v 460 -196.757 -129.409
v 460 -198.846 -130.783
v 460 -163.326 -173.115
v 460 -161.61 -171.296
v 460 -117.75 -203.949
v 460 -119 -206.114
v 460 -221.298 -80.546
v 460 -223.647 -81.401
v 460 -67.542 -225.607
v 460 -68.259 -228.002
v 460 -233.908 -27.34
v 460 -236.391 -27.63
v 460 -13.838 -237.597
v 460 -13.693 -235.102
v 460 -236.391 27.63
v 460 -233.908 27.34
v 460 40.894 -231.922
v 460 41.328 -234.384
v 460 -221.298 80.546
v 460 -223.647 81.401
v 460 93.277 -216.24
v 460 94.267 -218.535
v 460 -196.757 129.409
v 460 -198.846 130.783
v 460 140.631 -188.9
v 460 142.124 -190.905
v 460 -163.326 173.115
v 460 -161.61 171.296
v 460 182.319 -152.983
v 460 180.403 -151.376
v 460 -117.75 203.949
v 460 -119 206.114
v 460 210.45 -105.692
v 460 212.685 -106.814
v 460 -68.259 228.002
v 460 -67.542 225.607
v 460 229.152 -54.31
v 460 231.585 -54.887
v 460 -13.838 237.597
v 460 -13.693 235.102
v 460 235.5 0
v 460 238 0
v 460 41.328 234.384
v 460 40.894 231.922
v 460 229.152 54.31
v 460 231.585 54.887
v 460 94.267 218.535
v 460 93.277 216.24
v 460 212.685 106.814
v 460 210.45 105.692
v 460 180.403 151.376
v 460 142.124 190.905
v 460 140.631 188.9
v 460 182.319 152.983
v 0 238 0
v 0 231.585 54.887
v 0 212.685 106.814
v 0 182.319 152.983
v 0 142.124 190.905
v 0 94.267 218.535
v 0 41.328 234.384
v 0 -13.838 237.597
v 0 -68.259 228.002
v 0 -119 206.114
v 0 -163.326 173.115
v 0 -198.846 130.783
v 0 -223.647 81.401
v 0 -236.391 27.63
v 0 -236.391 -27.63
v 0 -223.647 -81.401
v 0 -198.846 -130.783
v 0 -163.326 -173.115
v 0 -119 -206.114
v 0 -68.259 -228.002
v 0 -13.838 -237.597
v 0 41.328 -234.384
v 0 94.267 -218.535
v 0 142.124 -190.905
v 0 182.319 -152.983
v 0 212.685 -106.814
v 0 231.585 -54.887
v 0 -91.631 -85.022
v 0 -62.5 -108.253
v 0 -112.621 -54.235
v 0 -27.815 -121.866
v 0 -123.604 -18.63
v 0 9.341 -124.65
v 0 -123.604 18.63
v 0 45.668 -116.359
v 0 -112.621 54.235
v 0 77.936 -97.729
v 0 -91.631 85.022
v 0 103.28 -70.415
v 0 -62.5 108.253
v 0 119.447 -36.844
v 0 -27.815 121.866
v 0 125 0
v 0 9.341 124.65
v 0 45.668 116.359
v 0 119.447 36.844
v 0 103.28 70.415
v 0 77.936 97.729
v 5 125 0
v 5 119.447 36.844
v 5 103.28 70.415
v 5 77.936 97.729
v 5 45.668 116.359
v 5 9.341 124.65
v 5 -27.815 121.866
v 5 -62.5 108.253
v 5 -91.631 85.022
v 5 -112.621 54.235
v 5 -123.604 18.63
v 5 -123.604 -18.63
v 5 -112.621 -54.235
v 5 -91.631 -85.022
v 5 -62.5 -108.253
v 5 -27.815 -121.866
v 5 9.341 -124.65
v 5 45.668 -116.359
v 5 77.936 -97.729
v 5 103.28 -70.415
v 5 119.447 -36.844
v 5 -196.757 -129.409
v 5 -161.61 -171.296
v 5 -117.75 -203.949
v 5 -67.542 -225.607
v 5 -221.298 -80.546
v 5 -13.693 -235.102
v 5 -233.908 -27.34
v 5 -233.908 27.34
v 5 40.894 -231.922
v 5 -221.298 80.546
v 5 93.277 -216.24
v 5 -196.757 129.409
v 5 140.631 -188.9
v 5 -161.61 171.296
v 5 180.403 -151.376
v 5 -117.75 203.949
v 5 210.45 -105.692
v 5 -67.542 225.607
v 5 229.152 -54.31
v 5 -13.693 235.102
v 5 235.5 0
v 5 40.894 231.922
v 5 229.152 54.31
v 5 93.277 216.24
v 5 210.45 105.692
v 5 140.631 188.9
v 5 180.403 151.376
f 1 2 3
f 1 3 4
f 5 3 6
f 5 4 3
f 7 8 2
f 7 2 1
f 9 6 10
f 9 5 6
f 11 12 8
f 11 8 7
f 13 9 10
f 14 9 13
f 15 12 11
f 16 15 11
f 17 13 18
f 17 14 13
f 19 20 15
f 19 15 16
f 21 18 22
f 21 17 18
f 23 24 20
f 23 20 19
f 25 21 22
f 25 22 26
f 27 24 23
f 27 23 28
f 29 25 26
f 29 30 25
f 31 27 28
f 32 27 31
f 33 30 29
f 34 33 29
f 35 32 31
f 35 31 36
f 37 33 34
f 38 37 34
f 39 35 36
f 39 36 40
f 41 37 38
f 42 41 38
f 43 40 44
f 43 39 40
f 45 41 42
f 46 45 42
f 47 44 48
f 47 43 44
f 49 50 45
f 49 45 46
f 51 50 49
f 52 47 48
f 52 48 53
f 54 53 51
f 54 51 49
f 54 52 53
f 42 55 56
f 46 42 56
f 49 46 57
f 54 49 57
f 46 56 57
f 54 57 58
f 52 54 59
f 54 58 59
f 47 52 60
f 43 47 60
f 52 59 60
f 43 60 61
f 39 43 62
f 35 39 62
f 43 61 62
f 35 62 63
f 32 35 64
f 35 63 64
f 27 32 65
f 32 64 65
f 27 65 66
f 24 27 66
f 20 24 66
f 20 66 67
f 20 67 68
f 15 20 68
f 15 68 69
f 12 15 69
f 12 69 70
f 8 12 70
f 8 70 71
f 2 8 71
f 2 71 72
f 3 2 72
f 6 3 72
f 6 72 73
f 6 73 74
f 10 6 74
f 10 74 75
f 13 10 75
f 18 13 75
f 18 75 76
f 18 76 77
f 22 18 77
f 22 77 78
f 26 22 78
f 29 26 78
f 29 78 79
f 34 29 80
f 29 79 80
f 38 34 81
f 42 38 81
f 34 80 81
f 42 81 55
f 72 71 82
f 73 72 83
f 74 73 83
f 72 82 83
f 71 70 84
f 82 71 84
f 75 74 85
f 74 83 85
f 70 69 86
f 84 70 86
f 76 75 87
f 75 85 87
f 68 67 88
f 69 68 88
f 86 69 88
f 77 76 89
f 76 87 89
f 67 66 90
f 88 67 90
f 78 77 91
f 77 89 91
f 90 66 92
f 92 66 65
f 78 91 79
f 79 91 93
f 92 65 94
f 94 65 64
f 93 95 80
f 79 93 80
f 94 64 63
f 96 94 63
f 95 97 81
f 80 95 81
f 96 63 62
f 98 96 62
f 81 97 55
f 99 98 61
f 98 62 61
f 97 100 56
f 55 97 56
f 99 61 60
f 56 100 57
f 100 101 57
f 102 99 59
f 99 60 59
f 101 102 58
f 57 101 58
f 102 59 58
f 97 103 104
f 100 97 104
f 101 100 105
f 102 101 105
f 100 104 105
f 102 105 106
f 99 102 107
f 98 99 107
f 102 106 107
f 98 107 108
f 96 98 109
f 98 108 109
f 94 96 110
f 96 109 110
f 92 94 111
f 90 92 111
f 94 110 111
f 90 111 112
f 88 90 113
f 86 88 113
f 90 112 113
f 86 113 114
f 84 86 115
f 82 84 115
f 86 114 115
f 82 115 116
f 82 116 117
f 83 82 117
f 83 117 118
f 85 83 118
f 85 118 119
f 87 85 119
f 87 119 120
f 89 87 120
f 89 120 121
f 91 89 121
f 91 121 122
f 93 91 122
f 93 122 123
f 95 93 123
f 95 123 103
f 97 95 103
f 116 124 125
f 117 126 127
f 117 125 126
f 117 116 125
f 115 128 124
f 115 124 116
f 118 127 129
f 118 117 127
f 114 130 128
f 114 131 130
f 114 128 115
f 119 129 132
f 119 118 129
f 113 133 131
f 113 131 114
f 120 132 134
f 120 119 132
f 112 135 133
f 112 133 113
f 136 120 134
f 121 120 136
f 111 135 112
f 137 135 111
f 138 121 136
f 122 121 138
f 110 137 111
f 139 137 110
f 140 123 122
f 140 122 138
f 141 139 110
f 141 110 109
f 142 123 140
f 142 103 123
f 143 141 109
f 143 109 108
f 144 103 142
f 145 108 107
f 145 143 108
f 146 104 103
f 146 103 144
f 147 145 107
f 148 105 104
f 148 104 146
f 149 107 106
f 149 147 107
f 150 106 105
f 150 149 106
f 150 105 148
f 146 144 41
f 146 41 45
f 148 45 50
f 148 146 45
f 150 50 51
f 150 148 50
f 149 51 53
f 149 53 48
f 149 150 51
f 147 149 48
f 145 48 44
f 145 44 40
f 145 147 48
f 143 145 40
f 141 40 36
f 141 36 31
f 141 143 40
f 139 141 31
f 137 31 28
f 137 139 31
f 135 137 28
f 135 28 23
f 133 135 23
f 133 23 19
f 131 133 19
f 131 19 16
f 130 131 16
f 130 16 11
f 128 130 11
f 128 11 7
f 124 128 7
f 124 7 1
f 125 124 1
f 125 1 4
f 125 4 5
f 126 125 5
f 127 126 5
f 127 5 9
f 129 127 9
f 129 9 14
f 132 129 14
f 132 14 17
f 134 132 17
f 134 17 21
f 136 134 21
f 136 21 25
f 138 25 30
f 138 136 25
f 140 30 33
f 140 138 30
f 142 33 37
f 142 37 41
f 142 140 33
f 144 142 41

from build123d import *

# Parameters (mm, degrees)
F0_R     = 238
F0_R_2   = 235.5
F1_DEPTH = 460
F2_R     = 238
F3_DEPTH = 5
F5_D     = 250
F5_DEPTH = 430


with BuildPart() as f1:
    # F0 (on Right) → F1 (new body)
    with BuildSketch(Plane.YZ):
        Circle(F0_R)
        Circle(F0_R_2, mode=Mode.SUBTRACT)
    extrude(amount=F1_DEPTH)

    # F2 (on Right) → F3 (join)
    with BuildSketch(Plane.YZ):
        Circle(F2_R)
    extrude(amount=F3_DEPTH)

    # F5
    with Locations(Plane(origin=(0, 0, 0), x_dir=(0, -1, 0), z_dir=(-1, 0, 0))):
        with Locations((0, 0)):
            Hole(F5_D / 2, depth=F5_DEPTH)


solid = f1.part
